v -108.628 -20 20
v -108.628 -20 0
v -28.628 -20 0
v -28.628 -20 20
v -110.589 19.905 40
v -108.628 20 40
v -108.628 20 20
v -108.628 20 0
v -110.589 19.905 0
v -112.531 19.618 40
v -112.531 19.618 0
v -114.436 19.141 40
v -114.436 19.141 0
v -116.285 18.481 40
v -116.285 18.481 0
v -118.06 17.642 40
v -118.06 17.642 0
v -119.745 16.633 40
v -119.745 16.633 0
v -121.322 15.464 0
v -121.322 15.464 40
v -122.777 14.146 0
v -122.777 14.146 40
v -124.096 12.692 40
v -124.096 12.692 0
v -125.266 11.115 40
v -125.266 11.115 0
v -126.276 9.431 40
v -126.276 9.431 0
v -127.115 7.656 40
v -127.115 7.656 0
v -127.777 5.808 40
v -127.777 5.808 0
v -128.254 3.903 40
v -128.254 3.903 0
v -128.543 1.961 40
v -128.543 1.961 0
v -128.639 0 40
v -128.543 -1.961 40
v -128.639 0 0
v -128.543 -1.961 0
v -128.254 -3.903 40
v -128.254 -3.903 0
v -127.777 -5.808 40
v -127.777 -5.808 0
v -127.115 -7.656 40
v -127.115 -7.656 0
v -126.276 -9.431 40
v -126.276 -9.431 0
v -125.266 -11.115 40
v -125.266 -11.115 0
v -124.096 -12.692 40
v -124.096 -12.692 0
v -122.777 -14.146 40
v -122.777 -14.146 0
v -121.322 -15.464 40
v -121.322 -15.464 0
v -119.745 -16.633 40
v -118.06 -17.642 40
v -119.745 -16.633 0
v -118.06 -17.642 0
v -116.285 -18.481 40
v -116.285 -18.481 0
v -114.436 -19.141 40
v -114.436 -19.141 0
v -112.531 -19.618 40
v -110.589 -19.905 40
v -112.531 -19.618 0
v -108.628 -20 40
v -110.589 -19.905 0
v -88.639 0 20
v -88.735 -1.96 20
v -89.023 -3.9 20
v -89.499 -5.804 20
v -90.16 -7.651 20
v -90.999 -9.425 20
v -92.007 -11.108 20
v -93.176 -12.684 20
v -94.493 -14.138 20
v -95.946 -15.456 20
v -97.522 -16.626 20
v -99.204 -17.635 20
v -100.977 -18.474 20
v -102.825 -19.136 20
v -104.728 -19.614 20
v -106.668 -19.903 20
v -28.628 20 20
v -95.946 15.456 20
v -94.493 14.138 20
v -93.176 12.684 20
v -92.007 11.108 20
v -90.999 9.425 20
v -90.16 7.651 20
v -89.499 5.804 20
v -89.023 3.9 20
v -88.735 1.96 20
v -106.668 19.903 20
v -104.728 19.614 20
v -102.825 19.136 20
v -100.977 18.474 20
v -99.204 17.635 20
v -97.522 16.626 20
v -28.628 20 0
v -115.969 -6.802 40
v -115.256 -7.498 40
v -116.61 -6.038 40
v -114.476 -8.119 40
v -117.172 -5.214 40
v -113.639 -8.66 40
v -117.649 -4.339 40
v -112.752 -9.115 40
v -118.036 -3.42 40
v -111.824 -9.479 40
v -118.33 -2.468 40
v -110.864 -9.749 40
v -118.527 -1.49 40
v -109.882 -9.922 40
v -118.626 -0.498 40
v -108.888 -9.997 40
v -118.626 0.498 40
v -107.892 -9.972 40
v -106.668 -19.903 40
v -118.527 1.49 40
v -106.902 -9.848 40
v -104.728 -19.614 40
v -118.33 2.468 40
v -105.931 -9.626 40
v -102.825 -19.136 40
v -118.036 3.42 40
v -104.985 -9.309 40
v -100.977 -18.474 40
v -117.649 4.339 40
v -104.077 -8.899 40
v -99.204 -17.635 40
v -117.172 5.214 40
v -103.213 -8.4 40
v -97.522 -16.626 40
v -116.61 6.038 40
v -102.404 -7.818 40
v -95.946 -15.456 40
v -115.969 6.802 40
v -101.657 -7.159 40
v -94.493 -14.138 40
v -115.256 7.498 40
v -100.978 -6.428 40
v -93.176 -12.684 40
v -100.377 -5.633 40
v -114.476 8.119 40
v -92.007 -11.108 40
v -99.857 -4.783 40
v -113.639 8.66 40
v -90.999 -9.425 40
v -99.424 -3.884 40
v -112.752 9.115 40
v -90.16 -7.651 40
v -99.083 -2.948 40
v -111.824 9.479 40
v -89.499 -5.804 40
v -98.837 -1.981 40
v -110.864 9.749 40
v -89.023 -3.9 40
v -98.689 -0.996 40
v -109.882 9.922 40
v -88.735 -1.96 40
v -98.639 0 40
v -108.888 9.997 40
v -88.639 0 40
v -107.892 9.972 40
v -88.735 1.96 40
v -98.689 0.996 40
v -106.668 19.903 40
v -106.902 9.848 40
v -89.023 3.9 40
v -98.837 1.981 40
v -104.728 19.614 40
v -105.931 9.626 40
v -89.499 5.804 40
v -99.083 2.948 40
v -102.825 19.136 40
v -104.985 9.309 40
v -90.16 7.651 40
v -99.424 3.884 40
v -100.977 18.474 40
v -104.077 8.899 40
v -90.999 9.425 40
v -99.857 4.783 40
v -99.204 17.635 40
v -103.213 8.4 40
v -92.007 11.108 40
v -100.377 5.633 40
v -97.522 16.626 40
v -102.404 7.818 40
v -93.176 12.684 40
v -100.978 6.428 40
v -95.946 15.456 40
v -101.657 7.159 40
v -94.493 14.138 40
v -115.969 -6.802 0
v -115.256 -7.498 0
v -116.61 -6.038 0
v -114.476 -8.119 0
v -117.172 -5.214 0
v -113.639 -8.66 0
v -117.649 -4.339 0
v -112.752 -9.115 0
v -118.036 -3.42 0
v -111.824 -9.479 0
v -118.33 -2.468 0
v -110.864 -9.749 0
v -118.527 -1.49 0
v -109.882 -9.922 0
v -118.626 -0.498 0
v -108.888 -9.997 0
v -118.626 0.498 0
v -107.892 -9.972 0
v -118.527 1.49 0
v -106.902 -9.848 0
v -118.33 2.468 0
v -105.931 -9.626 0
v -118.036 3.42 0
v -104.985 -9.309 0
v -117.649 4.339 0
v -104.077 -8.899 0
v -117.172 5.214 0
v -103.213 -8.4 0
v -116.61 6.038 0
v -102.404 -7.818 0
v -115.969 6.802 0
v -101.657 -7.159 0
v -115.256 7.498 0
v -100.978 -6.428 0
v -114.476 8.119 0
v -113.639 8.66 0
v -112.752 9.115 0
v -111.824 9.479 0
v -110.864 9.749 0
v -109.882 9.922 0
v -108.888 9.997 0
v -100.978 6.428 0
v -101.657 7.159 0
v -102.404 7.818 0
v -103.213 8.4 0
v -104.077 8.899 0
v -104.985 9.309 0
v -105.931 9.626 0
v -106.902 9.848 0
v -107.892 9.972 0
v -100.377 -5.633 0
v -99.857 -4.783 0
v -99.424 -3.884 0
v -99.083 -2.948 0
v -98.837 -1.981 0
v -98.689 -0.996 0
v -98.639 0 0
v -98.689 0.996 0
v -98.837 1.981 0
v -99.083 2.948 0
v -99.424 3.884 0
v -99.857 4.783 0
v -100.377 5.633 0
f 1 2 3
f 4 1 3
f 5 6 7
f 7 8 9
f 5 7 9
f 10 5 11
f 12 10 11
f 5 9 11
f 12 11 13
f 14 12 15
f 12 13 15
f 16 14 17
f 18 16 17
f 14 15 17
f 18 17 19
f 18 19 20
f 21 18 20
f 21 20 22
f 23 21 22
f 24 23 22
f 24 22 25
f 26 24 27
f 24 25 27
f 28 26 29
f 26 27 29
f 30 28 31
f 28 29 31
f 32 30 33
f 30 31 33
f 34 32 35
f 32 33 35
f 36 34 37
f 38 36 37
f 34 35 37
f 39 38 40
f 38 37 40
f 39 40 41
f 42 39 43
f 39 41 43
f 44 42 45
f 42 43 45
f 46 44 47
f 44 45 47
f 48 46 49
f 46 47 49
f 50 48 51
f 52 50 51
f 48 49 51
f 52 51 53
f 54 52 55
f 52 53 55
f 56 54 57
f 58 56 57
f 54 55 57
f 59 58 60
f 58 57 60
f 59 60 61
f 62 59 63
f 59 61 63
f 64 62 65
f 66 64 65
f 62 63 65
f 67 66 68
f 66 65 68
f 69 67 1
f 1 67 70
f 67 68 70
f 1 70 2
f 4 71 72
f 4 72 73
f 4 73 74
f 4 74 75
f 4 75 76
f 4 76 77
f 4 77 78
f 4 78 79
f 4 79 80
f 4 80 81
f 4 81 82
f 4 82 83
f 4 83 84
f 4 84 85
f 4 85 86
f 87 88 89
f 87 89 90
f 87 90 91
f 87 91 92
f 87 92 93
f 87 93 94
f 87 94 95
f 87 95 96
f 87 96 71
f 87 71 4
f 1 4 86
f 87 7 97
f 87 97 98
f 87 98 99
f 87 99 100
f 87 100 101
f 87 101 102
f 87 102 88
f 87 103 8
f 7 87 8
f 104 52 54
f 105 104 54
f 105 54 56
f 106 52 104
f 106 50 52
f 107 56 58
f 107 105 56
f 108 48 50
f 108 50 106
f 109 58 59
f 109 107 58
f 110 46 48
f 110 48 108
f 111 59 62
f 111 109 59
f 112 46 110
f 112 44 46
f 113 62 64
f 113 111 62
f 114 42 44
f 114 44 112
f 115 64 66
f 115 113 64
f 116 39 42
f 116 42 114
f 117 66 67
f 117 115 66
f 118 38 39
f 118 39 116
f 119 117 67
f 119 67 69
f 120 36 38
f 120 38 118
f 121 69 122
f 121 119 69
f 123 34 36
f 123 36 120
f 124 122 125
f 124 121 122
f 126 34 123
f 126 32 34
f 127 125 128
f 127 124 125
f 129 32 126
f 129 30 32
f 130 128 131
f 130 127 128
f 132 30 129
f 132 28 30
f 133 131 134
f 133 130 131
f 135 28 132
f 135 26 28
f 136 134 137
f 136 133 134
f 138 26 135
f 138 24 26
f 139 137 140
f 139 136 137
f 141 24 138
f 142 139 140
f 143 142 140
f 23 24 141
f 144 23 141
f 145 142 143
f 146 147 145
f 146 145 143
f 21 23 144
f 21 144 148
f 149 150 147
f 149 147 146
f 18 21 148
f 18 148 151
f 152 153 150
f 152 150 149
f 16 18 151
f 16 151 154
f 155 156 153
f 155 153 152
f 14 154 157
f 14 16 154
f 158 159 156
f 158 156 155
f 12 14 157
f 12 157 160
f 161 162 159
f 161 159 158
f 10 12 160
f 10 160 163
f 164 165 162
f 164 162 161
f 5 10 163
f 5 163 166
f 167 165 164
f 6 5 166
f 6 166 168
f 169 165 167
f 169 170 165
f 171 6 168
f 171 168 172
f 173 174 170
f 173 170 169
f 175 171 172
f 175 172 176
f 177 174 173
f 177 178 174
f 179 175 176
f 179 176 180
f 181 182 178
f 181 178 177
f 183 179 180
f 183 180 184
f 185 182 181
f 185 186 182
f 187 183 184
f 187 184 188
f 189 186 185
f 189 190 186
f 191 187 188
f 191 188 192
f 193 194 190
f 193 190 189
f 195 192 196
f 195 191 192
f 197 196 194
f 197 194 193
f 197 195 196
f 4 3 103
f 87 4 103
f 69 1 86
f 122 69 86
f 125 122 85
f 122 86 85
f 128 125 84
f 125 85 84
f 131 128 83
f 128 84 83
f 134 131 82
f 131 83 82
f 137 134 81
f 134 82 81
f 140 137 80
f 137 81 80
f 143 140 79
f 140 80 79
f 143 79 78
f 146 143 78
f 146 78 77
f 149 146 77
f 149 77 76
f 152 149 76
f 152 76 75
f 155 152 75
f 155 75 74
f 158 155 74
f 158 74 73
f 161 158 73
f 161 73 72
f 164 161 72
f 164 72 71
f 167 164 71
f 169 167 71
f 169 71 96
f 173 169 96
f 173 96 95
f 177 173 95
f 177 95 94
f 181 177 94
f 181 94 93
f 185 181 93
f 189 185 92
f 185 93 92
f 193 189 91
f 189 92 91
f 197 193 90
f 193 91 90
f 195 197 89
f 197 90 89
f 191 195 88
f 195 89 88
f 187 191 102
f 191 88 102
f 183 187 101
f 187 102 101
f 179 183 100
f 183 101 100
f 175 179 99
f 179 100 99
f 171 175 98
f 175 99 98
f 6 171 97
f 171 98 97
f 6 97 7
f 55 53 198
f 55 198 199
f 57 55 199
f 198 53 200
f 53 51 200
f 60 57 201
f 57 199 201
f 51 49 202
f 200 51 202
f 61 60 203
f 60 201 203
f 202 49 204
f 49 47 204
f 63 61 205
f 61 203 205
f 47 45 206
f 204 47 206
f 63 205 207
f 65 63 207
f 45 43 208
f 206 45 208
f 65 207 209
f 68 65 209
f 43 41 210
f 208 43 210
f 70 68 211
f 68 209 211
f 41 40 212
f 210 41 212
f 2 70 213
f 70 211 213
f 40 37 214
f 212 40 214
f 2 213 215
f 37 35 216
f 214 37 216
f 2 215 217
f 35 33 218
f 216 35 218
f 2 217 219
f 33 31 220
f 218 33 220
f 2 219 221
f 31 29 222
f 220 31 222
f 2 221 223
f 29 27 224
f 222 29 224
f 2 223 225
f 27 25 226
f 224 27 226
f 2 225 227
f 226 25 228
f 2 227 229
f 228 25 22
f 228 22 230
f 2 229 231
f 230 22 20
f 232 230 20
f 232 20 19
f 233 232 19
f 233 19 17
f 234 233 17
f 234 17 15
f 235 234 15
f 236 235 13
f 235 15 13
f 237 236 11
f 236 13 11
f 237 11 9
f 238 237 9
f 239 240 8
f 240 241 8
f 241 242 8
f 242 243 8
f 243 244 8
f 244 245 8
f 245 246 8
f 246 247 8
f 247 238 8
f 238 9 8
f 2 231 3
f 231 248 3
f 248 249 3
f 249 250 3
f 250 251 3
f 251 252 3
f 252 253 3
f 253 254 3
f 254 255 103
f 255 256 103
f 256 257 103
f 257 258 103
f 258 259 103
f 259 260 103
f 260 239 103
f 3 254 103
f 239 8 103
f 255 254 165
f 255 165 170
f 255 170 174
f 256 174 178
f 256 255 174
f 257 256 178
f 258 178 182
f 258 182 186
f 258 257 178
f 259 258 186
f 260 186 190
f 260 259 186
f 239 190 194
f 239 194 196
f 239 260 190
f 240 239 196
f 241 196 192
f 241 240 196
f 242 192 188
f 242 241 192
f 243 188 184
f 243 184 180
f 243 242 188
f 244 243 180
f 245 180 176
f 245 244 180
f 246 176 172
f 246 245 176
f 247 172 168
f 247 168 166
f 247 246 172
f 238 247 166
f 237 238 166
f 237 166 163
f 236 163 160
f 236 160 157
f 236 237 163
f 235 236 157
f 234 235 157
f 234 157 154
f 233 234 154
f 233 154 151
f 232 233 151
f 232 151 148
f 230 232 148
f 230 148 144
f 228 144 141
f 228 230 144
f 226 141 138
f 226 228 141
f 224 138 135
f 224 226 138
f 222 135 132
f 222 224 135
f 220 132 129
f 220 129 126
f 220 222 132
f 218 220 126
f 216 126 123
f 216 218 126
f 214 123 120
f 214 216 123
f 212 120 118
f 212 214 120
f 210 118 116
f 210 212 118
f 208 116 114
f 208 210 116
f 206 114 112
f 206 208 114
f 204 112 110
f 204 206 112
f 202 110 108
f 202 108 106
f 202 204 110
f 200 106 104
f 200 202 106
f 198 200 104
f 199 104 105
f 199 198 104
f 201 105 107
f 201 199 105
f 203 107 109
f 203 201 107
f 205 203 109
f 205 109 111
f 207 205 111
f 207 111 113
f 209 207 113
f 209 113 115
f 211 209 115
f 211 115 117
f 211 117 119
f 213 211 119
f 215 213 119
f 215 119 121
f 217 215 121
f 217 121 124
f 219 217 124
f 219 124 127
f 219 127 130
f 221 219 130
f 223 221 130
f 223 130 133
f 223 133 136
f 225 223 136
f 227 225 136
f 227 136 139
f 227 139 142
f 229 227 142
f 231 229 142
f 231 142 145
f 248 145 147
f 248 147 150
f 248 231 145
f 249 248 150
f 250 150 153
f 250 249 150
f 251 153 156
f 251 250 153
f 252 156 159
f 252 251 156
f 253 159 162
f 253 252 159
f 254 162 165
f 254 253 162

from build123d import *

# Parameters (mm, degrees)
F0_R     = 10
F1_DEPTH = 40
F2_DEPTH = 20


# Not quite as in the source:
# - ends of sketch curves that miss each other by under 0.0002 mm in the source are joined


with BuildPart() as f1:
    # F0 (on Top) → F1 (new body)
    with BuildSketch(Plane.XY):
        with BuildLine():
            ThreePointArc((-108.6277332274, -19.9999968788), (-94.4928212548, -14.1381846275), (-88.6389067712, 0))
            ThreePointArc((-88.6389067712, 0), (-94.4928212535, 14.1381846263), (-108.6277332239, 19.9999968788))
            ThreePointArc((-108.6277332239, 19.9999968788), (-128.6389067712, 1.7e-09), (-108.6277332274, -19.9999968788))
        make_face()
        with Locations((-108.6389067712, 0)):
            Circle(F0_R, mode=Mode.SUBTRACT)
    extrude(amount=F1_DEPTH)

    # F0 (on Top) → F2 (join)
    with BuildSketch(Plane.XY):
        with BuildLine():
            ThreePointArc((-108.6277332239, 19.9999968788), (-94.4928212535, 14.1381846263), (-88.6389067712, 0))
            ThreePointArc((-88.6389067712, 0), (-94.4928212548, -14.1381846275), (-108.6277332274, -19.9999968788))
            Line((-108.6277332274, -19.9999968788), (-28.6277332239, -20.0000031212))
            Line((-28.6277332239, -20.0000031212), (-28.6277332239, 19.9999968788))
            Line((-28.6277332239, 19.9999968788), (-108.6277332239, 19.9999968788))
        make_face()
    extrude(amount=F2_DEPTH)


solid = f1.part
